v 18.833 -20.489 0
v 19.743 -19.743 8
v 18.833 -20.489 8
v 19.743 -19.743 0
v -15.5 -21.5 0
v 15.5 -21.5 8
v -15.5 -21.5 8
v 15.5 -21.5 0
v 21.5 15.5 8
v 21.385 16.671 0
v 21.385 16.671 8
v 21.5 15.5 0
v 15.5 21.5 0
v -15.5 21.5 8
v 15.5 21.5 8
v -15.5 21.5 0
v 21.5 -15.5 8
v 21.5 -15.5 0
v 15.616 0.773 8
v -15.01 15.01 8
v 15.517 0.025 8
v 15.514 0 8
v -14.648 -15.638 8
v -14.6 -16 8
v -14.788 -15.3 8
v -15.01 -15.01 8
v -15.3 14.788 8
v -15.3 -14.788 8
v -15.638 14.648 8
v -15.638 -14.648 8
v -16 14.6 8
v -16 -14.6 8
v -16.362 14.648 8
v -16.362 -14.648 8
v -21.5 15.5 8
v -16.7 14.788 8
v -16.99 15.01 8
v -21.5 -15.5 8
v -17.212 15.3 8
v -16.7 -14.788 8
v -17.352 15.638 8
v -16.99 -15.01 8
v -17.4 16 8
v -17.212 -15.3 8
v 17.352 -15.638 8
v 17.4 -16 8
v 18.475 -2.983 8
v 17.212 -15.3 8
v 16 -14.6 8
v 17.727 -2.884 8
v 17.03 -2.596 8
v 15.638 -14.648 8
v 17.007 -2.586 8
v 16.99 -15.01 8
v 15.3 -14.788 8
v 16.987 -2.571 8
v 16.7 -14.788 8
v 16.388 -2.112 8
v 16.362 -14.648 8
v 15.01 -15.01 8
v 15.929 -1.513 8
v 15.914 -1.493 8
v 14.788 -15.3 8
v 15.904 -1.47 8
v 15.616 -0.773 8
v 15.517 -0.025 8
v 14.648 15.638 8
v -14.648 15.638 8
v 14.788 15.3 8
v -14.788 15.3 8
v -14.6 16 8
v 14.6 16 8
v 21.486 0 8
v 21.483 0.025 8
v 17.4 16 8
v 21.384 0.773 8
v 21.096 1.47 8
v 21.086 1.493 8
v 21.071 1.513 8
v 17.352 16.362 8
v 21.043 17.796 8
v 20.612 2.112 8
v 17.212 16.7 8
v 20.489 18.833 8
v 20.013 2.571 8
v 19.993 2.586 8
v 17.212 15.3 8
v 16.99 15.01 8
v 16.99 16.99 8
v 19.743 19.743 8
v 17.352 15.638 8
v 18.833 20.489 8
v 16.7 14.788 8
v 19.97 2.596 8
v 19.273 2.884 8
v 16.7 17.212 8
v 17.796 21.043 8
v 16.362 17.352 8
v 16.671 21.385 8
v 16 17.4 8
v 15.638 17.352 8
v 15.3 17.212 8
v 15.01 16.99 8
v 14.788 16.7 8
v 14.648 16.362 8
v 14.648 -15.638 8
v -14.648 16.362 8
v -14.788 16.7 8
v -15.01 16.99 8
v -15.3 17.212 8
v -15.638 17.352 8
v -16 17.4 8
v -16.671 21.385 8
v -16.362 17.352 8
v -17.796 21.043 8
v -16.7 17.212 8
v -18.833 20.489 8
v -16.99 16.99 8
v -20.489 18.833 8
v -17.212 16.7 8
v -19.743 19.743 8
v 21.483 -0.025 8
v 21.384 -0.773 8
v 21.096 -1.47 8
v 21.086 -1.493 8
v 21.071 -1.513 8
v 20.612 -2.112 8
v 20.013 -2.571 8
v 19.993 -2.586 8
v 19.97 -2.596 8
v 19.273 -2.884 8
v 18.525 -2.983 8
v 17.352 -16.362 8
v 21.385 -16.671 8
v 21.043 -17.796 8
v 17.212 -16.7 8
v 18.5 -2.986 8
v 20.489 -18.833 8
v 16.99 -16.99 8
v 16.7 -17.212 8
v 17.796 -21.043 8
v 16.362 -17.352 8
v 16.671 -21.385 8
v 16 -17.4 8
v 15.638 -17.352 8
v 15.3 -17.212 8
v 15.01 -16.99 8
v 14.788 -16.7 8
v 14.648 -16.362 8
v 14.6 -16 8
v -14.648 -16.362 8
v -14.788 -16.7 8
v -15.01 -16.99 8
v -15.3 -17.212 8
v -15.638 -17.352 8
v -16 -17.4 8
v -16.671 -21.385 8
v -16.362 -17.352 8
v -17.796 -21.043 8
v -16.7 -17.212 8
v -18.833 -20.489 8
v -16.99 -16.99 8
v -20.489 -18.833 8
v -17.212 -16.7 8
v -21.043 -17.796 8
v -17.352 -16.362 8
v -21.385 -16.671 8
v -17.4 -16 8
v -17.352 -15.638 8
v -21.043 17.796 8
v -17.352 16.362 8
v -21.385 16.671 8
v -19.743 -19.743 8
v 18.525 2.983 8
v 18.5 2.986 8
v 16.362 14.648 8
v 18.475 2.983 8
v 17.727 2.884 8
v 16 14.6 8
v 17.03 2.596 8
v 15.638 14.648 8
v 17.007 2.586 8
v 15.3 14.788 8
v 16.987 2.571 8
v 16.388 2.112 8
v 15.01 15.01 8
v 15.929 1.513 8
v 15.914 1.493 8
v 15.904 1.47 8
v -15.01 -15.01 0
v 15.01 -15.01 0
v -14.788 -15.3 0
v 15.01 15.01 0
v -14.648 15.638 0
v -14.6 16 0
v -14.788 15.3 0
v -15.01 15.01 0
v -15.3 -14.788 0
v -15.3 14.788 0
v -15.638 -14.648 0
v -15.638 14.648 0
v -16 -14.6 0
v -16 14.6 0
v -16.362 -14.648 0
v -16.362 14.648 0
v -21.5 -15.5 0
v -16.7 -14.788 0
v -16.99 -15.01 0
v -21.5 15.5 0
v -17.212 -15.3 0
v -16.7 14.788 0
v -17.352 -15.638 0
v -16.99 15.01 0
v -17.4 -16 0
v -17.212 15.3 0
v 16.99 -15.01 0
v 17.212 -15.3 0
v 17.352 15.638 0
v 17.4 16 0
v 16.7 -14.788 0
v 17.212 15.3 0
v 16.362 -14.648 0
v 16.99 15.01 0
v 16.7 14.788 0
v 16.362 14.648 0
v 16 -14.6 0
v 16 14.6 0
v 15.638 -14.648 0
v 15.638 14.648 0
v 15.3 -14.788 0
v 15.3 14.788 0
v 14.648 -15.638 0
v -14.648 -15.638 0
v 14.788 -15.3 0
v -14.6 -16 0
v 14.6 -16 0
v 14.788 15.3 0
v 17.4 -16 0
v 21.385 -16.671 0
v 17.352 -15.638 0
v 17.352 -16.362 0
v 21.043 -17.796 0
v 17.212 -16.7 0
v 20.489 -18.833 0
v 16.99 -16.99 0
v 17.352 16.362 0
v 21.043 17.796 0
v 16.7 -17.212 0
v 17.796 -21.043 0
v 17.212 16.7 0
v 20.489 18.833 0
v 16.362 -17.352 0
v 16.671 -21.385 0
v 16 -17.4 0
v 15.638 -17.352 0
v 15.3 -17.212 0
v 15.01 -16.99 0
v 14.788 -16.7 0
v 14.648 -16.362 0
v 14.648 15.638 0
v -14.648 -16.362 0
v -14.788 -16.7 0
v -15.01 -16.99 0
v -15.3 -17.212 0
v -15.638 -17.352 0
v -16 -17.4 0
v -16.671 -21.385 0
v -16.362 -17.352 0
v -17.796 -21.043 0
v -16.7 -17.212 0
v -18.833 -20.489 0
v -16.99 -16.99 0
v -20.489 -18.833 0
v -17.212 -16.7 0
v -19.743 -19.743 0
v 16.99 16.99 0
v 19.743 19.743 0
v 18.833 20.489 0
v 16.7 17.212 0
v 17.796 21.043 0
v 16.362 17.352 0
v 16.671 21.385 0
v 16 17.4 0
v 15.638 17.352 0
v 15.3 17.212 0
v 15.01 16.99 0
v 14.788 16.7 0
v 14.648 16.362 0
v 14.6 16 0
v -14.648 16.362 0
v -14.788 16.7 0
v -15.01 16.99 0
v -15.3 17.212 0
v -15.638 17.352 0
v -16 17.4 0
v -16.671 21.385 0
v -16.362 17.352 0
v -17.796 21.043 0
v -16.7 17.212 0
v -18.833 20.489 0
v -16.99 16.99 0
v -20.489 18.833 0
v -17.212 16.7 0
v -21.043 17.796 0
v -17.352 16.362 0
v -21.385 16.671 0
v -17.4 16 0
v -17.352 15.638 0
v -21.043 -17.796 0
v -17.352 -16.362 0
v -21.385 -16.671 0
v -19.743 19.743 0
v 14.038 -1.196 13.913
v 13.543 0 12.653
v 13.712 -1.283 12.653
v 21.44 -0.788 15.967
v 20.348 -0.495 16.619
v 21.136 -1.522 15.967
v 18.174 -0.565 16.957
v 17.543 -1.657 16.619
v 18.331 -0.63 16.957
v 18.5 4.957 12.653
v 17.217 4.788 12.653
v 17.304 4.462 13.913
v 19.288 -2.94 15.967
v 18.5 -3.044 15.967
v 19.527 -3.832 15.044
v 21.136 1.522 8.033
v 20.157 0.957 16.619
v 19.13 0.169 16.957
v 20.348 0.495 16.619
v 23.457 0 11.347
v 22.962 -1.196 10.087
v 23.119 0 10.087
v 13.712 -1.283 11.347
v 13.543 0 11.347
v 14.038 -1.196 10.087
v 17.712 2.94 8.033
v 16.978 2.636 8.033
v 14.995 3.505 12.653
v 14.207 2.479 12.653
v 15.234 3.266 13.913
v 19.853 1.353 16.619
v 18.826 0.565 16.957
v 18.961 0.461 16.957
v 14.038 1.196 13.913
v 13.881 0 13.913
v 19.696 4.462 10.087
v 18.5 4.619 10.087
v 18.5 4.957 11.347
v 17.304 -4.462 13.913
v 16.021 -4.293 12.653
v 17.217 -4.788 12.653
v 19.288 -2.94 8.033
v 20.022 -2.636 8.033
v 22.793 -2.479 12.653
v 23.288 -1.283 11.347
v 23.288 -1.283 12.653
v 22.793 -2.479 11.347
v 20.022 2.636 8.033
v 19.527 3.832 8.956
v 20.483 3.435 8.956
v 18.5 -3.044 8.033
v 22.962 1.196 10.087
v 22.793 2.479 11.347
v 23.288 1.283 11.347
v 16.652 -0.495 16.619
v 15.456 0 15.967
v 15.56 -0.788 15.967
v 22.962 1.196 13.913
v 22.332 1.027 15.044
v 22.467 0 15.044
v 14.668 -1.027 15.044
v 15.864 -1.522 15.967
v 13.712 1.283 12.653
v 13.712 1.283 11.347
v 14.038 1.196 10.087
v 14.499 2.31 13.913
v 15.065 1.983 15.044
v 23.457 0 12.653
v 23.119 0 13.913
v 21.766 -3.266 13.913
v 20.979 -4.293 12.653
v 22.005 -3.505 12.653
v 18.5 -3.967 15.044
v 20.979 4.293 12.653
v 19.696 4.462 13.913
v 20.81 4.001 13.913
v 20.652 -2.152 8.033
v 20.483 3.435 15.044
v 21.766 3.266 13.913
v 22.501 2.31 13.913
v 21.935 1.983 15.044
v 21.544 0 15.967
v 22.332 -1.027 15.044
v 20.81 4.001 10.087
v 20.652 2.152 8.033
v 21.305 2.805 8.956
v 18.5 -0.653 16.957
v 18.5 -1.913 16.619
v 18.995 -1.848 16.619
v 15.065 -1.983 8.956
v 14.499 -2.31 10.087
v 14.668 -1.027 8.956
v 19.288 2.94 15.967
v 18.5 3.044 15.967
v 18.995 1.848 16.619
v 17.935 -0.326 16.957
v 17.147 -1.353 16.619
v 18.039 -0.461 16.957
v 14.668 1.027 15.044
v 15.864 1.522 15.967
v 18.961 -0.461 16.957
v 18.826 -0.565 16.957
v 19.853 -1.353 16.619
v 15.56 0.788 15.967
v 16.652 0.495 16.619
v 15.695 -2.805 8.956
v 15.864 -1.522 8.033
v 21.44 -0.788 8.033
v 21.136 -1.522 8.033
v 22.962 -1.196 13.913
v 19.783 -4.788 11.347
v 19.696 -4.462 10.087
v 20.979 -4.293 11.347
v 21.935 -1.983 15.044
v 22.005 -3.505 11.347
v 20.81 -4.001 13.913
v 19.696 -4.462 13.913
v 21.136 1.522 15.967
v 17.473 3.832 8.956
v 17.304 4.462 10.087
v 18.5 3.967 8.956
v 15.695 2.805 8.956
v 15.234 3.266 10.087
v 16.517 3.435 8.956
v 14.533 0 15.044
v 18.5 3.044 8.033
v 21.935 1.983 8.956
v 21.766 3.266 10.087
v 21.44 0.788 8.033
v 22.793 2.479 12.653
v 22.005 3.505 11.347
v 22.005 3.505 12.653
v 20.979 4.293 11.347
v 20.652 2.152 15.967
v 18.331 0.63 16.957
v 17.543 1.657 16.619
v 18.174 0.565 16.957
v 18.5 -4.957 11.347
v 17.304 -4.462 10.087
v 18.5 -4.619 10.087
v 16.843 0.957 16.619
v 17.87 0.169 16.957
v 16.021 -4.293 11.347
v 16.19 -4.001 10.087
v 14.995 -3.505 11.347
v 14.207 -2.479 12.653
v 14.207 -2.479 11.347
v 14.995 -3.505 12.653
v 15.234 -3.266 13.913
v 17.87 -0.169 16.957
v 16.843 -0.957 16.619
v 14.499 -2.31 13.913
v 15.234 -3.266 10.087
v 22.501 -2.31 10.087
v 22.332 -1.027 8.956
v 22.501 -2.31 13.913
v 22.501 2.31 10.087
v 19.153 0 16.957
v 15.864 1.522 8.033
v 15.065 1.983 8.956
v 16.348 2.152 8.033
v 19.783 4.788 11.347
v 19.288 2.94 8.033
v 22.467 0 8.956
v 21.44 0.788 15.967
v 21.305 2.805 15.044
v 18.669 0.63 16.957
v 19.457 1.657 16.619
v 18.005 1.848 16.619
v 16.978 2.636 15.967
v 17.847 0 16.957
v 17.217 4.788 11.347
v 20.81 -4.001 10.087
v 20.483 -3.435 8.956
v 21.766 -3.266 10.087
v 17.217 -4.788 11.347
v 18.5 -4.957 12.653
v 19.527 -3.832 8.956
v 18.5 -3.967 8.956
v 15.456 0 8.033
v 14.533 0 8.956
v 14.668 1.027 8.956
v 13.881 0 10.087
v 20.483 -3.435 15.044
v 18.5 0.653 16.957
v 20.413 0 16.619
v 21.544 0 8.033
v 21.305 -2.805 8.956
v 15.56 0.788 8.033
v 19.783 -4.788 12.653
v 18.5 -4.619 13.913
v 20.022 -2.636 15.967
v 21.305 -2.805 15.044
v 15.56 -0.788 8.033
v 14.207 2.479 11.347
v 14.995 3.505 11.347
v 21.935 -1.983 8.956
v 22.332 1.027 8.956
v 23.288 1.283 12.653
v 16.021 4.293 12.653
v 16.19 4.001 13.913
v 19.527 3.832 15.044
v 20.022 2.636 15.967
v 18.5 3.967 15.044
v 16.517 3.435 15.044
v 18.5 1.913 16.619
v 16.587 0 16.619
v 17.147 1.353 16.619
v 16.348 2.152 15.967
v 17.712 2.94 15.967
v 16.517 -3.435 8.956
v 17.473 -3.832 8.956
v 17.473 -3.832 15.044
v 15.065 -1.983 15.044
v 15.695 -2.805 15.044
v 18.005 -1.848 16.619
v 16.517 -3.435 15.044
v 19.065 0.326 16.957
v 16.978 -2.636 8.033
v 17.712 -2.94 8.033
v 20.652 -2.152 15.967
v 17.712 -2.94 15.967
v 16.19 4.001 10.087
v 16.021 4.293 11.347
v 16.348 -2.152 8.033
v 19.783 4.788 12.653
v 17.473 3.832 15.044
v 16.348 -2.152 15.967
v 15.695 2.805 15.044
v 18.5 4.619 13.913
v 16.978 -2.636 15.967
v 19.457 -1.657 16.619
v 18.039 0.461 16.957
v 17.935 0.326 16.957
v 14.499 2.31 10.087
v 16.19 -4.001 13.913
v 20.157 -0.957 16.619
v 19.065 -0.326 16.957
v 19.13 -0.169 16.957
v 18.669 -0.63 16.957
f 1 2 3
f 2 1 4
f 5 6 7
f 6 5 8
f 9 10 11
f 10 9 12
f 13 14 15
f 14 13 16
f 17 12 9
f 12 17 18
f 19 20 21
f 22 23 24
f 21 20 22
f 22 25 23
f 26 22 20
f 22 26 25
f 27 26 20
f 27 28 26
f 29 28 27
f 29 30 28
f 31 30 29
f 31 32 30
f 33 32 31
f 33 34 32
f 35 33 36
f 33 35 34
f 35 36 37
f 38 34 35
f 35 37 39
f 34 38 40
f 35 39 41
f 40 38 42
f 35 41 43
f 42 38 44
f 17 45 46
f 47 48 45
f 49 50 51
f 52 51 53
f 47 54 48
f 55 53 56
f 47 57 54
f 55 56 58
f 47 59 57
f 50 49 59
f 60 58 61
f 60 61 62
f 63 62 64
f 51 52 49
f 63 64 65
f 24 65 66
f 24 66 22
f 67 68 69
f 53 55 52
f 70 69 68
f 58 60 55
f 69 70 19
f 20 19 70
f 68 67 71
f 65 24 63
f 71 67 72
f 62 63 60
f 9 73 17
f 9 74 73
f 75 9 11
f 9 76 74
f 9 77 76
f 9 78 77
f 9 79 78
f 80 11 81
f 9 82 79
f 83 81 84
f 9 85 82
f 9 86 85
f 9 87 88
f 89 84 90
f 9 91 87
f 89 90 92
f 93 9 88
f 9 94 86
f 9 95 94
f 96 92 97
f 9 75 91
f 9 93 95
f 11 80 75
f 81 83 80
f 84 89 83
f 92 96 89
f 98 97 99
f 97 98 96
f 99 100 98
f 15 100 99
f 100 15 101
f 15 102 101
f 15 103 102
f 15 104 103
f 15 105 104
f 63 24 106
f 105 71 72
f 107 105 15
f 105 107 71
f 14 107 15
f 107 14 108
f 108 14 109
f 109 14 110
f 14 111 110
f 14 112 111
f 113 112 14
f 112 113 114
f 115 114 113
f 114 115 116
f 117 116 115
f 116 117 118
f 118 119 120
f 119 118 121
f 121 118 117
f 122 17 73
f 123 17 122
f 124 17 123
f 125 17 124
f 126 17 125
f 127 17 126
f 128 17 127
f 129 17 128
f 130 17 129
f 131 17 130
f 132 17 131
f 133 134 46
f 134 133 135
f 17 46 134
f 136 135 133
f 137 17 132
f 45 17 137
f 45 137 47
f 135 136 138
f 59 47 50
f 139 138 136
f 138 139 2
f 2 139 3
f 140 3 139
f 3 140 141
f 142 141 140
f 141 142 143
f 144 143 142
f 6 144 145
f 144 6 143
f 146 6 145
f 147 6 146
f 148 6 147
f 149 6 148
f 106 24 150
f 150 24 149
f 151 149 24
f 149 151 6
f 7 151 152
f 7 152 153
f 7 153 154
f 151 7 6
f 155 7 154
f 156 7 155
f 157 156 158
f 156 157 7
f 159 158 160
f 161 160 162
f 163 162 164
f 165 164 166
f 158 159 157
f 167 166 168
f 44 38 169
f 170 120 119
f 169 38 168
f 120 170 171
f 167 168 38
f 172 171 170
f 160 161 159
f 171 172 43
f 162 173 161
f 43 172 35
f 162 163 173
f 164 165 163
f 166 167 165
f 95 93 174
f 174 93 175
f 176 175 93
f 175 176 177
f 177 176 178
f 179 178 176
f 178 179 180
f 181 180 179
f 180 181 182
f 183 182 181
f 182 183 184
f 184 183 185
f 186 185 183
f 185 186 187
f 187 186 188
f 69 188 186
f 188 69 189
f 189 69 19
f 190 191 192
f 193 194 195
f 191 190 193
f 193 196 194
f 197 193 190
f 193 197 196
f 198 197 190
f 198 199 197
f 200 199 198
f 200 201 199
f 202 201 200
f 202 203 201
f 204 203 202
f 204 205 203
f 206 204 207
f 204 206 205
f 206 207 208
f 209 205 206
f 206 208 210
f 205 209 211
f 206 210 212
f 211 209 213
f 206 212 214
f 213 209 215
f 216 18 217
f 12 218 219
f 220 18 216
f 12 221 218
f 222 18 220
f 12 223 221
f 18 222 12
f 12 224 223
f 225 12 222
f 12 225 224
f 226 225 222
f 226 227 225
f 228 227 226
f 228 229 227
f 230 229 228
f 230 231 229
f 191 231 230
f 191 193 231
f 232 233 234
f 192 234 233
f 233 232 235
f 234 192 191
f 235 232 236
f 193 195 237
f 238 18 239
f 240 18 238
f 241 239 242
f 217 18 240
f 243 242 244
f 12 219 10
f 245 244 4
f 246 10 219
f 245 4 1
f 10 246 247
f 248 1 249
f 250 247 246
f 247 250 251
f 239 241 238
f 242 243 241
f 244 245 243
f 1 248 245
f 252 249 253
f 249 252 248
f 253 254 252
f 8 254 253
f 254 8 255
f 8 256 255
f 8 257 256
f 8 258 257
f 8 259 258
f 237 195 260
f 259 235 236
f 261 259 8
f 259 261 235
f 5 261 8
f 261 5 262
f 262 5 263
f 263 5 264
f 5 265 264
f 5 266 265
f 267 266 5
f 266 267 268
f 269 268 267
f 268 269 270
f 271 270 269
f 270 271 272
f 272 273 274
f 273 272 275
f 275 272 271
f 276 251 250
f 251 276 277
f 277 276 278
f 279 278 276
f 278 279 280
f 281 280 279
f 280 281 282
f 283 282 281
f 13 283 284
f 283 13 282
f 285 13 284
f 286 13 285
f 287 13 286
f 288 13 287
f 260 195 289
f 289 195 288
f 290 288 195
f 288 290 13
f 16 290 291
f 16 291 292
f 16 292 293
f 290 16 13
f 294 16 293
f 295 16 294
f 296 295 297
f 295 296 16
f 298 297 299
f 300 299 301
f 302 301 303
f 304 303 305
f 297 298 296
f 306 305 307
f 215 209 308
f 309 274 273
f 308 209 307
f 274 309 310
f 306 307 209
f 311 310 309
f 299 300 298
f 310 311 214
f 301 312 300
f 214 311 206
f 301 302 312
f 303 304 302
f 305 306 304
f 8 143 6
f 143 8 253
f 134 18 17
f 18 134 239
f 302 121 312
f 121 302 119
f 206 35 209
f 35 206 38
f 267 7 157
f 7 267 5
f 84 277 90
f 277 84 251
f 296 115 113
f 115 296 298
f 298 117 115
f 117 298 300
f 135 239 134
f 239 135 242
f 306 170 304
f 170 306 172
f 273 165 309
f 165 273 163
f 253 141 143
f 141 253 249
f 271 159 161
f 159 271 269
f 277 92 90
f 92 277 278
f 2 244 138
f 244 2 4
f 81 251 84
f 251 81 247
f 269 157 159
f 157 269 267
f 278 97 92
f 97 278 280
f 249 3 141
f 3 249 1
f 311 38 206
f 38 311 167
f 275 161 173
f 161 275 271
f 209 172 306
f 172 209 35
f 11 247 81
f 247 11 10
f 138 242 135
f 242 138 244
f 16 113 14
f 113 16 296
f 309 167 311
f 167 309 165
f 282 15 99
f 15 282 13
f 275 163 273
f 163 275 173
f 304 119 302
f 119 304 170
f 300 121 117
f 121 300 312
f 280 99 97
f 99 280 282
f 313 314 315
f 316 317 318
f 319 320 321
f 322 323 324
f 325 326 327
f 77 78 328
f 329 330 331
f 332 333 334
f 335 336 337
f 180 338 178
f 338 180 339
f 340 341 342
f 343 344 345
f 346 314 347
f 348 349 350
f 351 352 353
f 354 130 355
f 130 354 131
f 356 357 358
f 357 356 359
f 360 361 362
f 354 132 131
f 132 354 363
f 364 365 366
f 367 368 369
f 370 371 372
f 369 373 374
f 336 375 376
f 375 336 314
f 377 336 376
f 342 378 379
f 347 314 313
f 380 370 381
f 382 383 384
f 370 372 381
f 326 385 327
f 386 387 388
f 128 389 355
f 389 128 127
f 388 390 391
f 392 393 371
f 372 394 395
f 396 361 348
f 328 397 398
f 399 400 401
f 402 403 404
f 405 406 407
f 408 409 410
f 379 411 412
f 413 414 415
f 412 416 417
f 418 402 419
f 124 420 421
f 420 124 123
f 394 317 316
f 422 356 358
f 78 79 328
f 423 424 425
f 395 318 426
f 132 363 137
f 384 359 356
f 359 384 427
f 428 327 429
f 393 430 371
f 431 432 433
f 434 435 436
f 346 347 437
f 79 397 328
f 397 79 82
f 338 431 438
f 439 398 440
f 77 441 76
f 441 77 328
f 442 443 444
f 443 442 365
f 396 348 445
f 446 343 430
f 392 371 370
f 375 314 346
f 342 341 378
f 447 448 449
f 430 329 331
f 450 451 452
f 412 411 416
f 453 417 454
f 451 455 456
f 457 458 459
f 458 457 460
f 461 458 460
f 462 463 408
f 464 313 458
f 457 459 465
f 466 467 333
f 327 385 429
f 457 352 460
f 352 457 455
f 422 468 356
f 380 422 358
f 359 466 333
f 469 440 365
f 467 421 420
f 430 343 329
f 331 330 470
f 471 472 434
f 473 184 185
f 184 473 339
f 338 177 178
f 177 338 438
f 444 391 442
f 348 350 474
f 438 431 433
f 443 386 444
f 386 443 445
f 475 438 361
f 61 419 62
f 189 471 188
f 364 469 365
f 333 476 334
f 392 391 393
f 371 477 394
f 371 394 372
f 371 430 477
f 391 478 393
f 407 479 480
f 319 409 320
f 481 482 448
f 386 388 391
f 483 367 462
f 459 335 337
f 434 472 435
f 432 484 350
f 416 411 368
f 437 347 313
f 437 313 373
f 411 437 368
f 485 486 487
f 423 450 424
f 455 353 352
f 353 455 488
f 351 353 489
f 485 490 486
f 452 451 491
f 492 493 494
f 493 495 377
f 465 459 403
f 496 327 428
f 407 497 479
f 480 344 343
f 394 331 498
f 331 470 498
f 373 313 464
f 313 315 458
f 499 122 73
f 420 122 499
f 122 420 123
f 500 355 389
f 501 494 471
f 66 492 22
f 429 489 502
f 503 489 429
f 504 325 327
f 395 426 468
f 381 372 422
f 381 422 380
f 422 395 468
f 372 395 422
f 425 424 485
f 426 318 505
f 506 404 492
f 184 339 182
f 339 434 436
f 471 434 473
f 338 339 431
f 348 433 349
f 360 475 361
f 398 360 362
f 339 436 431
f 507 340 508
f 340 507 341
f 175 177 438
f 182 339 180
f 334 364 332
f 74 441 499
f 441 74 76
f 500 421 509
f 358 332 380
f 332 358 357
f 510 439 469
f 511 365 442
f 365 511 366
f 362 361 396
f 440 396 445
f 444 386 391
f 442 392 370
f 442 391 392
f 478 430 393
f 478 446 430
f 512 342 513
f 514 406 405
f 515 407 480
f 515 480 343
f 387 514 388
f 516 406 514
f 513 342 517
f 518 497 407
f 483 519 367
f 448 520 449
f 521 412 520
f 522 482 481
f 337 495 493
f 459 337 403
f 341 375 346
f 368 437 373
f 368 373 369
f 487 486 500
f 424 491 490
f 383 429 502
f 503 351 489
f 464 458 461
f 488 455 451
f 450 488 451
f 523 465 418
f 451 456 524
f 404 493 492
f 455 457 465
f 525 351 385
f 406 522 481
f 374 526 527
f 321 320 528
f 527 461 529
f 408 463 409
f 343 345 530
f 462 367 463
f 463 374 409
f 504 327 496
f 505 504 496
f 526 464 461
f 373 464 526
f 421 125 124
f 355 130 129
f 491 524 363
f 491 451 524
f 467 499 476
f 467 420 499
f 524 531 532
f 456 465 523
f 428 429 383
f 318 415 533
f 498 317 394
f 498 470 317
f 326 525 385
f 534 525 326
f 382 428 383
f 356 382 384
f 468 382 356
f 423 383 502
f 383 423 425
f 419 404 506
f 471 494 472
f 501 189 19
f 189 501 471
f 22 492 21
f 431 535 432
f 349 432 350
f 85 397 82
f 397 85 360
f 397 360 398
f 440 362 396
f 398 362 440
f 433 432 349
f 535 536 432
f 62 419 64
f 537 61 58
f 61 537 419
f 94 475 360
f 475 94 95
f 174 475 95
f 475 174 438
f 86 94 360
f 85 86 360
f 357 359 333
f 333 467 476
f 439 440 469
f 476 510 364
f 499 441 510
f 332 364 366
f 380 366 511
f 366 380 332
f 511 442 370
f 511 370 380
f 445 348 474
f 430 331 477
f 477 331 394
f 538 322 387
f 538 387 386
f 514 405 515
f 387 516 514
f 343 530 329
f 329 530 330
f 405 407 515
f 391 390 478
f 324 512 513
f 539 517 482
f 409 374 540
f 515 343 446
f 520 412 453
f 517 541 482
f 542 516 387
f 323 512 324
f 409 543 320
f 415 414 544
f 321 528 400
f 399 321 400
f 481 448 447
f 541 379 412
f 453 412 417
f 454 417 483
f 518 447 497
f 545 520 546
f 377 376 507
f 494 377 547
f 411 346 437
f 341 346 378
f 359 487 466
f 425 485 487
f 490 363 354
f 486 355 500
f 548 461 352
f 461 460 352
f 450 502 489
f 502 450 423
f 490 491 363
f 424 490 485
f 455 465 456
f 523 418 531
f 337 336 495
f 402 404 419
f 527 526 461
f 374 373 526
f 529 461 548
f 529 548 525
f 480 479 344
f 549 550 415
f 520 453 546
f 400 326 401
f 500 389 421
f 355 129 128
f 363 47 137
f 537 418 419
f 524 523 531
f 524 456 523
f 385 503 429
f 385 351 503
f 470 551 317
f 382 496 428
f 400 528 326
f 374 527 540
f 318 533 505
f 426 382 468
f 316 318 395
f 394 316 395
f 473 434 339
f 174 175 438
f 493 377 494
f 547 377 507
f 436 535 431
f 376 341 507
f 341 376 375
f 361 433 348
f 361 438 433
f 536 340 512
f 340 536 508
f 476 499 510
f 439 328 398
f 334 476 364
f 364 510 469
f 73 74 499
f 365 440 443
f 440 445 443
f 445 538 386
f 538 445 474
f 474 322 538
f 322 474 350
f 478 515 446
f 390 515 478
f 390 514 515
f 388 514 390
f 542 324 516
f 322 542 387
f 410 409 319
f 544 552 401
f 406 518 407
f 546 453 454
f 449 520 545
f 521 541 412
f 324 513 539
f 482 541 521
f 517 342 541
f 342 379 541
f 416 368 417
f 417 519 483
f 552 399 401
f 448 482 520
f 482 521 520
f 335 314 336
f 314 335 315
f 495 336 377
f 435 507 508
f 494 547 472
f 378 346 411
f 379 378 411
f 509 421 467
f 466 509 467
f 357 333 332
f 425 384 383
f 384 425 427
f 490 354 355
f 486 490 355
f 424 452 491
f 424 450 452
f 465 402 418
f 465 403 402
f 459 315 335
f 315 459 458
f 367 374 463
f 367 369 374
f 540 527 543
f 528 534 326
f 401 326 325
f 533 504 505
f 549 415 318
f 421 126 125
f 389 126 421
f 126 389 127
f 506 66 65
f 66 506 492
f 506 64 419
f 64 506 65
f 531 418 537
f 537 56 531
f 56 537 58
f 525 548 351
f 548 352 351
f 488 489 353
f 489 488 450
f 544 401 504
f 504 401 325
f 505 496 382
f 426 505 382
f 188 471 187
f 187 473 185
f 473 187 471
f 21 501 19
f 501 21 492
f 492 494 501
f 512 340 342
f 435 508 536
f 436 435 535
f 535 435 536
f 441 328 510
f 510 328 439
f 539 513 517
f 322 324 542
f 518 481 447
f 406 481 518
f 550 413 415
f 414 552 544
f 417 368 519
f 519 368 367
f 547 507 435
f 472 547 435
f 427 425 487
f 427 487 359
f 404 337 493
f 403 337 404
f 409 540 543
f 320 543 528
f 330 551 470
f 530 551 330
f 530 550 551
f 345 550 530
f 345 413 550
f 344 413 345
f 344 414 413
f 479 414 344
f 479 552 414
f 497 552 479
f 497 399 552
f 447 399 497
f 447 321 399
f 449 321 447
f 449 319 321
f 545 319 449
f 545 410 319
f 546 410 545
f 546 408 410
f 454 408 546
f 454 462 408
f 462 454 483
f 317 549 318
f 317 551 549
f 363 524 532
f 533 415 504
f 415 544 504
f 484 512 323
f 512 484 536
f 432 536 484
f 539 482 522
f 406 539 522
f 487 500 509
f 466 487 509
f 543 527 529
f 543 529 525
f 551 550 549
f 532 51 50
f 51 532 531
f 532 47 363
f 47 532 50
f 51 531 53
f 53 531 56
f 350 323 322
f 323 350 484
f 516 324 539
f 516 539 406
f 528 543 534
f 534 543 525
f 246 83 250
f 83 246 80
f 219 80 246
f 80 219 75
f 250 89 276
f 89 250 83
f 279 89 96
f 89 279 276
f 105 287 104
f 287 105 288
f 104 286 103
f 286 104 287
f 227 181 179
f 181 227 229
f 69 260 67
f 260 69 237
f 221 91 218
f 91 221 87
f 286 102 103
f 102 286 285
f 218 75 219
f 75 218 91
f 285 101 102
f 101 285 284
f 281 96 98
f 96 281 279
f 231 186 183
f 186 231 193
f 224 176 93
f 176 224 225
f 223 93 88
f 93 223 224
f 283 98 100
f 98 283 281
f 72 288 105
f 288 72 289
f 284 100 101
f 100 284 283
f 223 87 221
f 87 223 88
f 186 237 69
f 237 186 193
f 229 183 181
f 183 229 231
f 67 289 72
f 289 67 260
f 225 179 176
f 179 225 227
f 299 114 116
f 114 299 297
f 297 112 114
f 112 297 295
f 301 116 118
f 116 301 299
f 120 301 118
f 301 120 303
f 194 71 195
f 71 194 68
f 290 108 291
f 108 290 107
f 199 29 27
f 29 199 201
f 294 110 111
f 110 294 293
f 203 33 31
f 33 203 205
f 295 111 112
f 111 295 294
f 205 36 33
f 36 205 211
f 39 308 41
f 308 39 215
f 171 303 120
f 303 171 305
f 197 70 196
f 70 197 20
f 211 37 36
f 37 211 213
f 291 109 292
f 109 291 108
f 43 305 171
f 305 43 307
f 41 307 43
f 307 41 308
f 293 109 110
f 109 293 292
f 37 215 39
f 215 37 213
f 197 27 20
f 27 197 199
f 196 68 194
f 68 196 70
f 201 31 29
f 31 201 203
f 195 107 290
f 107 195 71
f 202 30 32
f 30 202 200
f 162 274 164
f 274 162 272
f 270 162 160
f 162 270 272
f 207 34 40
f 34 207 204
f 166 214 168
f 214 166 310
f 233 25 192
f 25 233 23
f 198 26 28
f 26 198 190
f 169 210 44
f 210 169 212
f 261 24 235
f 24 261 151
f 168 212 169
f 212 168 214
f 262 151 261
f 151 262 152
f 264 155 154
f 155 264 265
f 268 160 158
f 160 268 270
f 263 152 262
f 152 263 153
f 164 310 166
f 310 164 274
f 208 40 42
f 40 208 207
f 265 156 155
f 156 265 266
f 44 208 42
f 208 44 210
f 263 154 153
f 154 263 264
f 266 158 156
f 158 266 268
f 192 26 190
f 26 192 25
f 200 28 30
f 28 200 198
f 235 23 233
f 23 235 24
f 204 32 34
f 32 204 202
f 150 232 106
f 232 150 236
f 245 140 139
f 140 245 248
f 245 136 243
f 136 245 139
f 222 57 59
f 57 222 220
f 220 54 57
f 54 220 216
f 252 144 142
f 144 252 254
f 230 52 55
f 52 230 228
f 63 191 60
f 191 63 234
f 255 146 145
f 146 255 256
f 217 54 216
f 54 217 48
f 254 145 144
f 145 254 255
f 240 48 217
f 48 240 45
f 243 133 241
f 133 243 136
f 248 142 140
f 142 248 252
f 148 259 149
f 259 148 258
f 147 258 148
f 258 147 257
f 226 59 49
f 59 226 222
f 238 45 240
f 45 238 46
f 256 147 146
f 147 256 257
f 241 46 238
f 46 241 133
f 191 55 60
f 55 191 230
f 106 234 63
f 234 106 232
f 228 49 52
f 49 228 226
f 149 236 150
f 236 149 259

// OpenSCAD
//Golden Spiral Fan Duct v0.1 
//Edward Stradinger - Jan 2014
//Derivative of http://www.thingiverse.com/thing:139984 by ei8ghtohms
//Given fan dimensions construct a conical shroud featuring internal fins to
//guide the airflow into a vortex.  As the cross sectional area of the cone
//decreases the radial motion component also decreases, allowing a greater 
//distance over which the air can accelerate, diminishing turbulent flow
//and fostering an axial low pressure zone which, upon exiting the nozzle,
//increases the duration of vortex coherence.  

/*[General Settings:]*/
//perimeter extrusion width configured in your slicing utility
perimeter_extrusion_width=.5;
//constant exponent denominator to relate unitless phi to units of measurement
scale_factor = 10;
//golden ratio conjugate selected for reduction.  Add significant digits as desired.
phi=0.618034;
//default number of facets generated.
$fn = 24;
//Layer height in mm, smaller gives better resolution but more polygons
layer_height = .5;

/*[Mounting Bracket:]*/
//mounting bracket side in mm
mount_side = 40; 
//height of mounting bracket in mm
mount_height = 8;
//Distance between screw bore centers in mm
screw_distance = 32;
//diameter of screw bores
screw_diameter = 2.8;
//radius of mounting bracket corner rounds
corner_radius= 6;
//radius of ball joint sphere
ball_radius = 5; 
//fraction of ball radius protruding above mounting surface
ball_inset = .8; 

/*[Duct Configuration]*/
//Fan Diameter in mm
fan_diameter = 38;
//Desired height of duct in mm
duct_height = 30;
//thickness of outer walls in mm
wall_thickness = 1.5;
//number of desired fins
fins=5;
//direction of fin rotation.  1=clockwise, -1=counterclockwise
direction = -1;


/*[Additional Relations]*/

//for readability
fan_radius=fan_diameter/2;
//number of layers through which to iterate
layer_count = duct_height/layer_height;
//diameter of nozzle at desired height
nozzle_diameter = fan_diameter * pow(phi, duct_height/scale_factor);
//fin thickness at tip on layer 1
fin_minimum = perimeter_extrusion_width/pow(phi,duct_height/scale_factor);
//fin thickness at inner wall on layer 1
fin_thickness=fin_minimum*(1+phi);//max thickness of fins in mm

difference(){
	union(){  
		translate([0,0,mount_height/2]) //mounting bracket with corner rounds
			minkowski(){
				cube([	mount_side+2*wall_thickness - 2*corner_radius,
						mount_side+2*wall_thickness - 2*corner_radius,
						mount_height-1],
						center=true);
				cylinder(	r=corner_radius,
							h=1,
							$fn=32,
							center=true);				
		}
		rotate_extrude(convexity=4, $fn=48) //outer wall - 2d polygon, rotate vertical, spin
			union(){
				for(i=[0:layer_height:duct_height-layer_height]){
					rotate([90,0,0])
					polygon(points=[	[0,i],
									[0,i+layer_height],
									[(fan_radius)*pow(phi,(i+layer_height)/scale_factor)+wall_thickness,
										i+layer_height],
									[(fan_radius)*pow(phi,(i/scale_factor))+wall_thickness,
										i]]);
				}
			}
		translate([		mount_side/2 + //add ball joint
						wall_thickness - 
						ball_radius*cos(asin(ball_inset)), 
						0,
						mount_height + ball_radius * ball_inset])
			sphere(		r=ball_radius,
						center=true,
						$fn=24);
	}
	union(){//construct negative space within
		difference(){
			rotate_extrude(convexity=4) //inner wall
				union(){
					for(i=[0:layer_height:duct_height-layer_height]){
						rotate([90,0,0])
							polygon(points=[	[0,i],
									[0,i+layer_height],
									[(fan_radius)*pow(phi,(i+layer_height)/scale_factor),
										i+layer_height],
									[(fan_radius)*pow(phi,(i/scale_factor)),
										i]]);
				}
			}
			
				union(){
					for(i= [0:fins-1]){//iterate through fins
						
						rotate([	0,0,(360/fins * i)])
							linear_extrude(	height=duct_height,
 		  							twist=direction * 360 * pow(phi,duct_height/scale_factor),
									scale=pow(phi,duct_height/scale_factor),
									slices=layer_count)
					
							translate([fan_radius*((2-phi)/2),0,0])
								polygon(points=//vertices of fin slice.  
									[[-fan_radius * phi/2,-fin_minimum/2],
									[-fan_radius * phi/2,fin_minimum/2],
									[fan_radius * phi/2,fin_thickness/2],
									[fan_radius * phi/2 + fin_thickness/2, 0],
									[fan_radius * phi/2, -fin_thickness/2]]);
					}
				}
			
		}	  
	}
  	for(i = [0:3]){//diff screw bores 
		rotate([0,0,90*i])
		translate([screw_distance/2,screw_distance/2,mount_height/2])	  
			cylinder(	r=screw_diameter/2,
				 		h=mount_height,
				 		center=true);
 	}
}	
  
